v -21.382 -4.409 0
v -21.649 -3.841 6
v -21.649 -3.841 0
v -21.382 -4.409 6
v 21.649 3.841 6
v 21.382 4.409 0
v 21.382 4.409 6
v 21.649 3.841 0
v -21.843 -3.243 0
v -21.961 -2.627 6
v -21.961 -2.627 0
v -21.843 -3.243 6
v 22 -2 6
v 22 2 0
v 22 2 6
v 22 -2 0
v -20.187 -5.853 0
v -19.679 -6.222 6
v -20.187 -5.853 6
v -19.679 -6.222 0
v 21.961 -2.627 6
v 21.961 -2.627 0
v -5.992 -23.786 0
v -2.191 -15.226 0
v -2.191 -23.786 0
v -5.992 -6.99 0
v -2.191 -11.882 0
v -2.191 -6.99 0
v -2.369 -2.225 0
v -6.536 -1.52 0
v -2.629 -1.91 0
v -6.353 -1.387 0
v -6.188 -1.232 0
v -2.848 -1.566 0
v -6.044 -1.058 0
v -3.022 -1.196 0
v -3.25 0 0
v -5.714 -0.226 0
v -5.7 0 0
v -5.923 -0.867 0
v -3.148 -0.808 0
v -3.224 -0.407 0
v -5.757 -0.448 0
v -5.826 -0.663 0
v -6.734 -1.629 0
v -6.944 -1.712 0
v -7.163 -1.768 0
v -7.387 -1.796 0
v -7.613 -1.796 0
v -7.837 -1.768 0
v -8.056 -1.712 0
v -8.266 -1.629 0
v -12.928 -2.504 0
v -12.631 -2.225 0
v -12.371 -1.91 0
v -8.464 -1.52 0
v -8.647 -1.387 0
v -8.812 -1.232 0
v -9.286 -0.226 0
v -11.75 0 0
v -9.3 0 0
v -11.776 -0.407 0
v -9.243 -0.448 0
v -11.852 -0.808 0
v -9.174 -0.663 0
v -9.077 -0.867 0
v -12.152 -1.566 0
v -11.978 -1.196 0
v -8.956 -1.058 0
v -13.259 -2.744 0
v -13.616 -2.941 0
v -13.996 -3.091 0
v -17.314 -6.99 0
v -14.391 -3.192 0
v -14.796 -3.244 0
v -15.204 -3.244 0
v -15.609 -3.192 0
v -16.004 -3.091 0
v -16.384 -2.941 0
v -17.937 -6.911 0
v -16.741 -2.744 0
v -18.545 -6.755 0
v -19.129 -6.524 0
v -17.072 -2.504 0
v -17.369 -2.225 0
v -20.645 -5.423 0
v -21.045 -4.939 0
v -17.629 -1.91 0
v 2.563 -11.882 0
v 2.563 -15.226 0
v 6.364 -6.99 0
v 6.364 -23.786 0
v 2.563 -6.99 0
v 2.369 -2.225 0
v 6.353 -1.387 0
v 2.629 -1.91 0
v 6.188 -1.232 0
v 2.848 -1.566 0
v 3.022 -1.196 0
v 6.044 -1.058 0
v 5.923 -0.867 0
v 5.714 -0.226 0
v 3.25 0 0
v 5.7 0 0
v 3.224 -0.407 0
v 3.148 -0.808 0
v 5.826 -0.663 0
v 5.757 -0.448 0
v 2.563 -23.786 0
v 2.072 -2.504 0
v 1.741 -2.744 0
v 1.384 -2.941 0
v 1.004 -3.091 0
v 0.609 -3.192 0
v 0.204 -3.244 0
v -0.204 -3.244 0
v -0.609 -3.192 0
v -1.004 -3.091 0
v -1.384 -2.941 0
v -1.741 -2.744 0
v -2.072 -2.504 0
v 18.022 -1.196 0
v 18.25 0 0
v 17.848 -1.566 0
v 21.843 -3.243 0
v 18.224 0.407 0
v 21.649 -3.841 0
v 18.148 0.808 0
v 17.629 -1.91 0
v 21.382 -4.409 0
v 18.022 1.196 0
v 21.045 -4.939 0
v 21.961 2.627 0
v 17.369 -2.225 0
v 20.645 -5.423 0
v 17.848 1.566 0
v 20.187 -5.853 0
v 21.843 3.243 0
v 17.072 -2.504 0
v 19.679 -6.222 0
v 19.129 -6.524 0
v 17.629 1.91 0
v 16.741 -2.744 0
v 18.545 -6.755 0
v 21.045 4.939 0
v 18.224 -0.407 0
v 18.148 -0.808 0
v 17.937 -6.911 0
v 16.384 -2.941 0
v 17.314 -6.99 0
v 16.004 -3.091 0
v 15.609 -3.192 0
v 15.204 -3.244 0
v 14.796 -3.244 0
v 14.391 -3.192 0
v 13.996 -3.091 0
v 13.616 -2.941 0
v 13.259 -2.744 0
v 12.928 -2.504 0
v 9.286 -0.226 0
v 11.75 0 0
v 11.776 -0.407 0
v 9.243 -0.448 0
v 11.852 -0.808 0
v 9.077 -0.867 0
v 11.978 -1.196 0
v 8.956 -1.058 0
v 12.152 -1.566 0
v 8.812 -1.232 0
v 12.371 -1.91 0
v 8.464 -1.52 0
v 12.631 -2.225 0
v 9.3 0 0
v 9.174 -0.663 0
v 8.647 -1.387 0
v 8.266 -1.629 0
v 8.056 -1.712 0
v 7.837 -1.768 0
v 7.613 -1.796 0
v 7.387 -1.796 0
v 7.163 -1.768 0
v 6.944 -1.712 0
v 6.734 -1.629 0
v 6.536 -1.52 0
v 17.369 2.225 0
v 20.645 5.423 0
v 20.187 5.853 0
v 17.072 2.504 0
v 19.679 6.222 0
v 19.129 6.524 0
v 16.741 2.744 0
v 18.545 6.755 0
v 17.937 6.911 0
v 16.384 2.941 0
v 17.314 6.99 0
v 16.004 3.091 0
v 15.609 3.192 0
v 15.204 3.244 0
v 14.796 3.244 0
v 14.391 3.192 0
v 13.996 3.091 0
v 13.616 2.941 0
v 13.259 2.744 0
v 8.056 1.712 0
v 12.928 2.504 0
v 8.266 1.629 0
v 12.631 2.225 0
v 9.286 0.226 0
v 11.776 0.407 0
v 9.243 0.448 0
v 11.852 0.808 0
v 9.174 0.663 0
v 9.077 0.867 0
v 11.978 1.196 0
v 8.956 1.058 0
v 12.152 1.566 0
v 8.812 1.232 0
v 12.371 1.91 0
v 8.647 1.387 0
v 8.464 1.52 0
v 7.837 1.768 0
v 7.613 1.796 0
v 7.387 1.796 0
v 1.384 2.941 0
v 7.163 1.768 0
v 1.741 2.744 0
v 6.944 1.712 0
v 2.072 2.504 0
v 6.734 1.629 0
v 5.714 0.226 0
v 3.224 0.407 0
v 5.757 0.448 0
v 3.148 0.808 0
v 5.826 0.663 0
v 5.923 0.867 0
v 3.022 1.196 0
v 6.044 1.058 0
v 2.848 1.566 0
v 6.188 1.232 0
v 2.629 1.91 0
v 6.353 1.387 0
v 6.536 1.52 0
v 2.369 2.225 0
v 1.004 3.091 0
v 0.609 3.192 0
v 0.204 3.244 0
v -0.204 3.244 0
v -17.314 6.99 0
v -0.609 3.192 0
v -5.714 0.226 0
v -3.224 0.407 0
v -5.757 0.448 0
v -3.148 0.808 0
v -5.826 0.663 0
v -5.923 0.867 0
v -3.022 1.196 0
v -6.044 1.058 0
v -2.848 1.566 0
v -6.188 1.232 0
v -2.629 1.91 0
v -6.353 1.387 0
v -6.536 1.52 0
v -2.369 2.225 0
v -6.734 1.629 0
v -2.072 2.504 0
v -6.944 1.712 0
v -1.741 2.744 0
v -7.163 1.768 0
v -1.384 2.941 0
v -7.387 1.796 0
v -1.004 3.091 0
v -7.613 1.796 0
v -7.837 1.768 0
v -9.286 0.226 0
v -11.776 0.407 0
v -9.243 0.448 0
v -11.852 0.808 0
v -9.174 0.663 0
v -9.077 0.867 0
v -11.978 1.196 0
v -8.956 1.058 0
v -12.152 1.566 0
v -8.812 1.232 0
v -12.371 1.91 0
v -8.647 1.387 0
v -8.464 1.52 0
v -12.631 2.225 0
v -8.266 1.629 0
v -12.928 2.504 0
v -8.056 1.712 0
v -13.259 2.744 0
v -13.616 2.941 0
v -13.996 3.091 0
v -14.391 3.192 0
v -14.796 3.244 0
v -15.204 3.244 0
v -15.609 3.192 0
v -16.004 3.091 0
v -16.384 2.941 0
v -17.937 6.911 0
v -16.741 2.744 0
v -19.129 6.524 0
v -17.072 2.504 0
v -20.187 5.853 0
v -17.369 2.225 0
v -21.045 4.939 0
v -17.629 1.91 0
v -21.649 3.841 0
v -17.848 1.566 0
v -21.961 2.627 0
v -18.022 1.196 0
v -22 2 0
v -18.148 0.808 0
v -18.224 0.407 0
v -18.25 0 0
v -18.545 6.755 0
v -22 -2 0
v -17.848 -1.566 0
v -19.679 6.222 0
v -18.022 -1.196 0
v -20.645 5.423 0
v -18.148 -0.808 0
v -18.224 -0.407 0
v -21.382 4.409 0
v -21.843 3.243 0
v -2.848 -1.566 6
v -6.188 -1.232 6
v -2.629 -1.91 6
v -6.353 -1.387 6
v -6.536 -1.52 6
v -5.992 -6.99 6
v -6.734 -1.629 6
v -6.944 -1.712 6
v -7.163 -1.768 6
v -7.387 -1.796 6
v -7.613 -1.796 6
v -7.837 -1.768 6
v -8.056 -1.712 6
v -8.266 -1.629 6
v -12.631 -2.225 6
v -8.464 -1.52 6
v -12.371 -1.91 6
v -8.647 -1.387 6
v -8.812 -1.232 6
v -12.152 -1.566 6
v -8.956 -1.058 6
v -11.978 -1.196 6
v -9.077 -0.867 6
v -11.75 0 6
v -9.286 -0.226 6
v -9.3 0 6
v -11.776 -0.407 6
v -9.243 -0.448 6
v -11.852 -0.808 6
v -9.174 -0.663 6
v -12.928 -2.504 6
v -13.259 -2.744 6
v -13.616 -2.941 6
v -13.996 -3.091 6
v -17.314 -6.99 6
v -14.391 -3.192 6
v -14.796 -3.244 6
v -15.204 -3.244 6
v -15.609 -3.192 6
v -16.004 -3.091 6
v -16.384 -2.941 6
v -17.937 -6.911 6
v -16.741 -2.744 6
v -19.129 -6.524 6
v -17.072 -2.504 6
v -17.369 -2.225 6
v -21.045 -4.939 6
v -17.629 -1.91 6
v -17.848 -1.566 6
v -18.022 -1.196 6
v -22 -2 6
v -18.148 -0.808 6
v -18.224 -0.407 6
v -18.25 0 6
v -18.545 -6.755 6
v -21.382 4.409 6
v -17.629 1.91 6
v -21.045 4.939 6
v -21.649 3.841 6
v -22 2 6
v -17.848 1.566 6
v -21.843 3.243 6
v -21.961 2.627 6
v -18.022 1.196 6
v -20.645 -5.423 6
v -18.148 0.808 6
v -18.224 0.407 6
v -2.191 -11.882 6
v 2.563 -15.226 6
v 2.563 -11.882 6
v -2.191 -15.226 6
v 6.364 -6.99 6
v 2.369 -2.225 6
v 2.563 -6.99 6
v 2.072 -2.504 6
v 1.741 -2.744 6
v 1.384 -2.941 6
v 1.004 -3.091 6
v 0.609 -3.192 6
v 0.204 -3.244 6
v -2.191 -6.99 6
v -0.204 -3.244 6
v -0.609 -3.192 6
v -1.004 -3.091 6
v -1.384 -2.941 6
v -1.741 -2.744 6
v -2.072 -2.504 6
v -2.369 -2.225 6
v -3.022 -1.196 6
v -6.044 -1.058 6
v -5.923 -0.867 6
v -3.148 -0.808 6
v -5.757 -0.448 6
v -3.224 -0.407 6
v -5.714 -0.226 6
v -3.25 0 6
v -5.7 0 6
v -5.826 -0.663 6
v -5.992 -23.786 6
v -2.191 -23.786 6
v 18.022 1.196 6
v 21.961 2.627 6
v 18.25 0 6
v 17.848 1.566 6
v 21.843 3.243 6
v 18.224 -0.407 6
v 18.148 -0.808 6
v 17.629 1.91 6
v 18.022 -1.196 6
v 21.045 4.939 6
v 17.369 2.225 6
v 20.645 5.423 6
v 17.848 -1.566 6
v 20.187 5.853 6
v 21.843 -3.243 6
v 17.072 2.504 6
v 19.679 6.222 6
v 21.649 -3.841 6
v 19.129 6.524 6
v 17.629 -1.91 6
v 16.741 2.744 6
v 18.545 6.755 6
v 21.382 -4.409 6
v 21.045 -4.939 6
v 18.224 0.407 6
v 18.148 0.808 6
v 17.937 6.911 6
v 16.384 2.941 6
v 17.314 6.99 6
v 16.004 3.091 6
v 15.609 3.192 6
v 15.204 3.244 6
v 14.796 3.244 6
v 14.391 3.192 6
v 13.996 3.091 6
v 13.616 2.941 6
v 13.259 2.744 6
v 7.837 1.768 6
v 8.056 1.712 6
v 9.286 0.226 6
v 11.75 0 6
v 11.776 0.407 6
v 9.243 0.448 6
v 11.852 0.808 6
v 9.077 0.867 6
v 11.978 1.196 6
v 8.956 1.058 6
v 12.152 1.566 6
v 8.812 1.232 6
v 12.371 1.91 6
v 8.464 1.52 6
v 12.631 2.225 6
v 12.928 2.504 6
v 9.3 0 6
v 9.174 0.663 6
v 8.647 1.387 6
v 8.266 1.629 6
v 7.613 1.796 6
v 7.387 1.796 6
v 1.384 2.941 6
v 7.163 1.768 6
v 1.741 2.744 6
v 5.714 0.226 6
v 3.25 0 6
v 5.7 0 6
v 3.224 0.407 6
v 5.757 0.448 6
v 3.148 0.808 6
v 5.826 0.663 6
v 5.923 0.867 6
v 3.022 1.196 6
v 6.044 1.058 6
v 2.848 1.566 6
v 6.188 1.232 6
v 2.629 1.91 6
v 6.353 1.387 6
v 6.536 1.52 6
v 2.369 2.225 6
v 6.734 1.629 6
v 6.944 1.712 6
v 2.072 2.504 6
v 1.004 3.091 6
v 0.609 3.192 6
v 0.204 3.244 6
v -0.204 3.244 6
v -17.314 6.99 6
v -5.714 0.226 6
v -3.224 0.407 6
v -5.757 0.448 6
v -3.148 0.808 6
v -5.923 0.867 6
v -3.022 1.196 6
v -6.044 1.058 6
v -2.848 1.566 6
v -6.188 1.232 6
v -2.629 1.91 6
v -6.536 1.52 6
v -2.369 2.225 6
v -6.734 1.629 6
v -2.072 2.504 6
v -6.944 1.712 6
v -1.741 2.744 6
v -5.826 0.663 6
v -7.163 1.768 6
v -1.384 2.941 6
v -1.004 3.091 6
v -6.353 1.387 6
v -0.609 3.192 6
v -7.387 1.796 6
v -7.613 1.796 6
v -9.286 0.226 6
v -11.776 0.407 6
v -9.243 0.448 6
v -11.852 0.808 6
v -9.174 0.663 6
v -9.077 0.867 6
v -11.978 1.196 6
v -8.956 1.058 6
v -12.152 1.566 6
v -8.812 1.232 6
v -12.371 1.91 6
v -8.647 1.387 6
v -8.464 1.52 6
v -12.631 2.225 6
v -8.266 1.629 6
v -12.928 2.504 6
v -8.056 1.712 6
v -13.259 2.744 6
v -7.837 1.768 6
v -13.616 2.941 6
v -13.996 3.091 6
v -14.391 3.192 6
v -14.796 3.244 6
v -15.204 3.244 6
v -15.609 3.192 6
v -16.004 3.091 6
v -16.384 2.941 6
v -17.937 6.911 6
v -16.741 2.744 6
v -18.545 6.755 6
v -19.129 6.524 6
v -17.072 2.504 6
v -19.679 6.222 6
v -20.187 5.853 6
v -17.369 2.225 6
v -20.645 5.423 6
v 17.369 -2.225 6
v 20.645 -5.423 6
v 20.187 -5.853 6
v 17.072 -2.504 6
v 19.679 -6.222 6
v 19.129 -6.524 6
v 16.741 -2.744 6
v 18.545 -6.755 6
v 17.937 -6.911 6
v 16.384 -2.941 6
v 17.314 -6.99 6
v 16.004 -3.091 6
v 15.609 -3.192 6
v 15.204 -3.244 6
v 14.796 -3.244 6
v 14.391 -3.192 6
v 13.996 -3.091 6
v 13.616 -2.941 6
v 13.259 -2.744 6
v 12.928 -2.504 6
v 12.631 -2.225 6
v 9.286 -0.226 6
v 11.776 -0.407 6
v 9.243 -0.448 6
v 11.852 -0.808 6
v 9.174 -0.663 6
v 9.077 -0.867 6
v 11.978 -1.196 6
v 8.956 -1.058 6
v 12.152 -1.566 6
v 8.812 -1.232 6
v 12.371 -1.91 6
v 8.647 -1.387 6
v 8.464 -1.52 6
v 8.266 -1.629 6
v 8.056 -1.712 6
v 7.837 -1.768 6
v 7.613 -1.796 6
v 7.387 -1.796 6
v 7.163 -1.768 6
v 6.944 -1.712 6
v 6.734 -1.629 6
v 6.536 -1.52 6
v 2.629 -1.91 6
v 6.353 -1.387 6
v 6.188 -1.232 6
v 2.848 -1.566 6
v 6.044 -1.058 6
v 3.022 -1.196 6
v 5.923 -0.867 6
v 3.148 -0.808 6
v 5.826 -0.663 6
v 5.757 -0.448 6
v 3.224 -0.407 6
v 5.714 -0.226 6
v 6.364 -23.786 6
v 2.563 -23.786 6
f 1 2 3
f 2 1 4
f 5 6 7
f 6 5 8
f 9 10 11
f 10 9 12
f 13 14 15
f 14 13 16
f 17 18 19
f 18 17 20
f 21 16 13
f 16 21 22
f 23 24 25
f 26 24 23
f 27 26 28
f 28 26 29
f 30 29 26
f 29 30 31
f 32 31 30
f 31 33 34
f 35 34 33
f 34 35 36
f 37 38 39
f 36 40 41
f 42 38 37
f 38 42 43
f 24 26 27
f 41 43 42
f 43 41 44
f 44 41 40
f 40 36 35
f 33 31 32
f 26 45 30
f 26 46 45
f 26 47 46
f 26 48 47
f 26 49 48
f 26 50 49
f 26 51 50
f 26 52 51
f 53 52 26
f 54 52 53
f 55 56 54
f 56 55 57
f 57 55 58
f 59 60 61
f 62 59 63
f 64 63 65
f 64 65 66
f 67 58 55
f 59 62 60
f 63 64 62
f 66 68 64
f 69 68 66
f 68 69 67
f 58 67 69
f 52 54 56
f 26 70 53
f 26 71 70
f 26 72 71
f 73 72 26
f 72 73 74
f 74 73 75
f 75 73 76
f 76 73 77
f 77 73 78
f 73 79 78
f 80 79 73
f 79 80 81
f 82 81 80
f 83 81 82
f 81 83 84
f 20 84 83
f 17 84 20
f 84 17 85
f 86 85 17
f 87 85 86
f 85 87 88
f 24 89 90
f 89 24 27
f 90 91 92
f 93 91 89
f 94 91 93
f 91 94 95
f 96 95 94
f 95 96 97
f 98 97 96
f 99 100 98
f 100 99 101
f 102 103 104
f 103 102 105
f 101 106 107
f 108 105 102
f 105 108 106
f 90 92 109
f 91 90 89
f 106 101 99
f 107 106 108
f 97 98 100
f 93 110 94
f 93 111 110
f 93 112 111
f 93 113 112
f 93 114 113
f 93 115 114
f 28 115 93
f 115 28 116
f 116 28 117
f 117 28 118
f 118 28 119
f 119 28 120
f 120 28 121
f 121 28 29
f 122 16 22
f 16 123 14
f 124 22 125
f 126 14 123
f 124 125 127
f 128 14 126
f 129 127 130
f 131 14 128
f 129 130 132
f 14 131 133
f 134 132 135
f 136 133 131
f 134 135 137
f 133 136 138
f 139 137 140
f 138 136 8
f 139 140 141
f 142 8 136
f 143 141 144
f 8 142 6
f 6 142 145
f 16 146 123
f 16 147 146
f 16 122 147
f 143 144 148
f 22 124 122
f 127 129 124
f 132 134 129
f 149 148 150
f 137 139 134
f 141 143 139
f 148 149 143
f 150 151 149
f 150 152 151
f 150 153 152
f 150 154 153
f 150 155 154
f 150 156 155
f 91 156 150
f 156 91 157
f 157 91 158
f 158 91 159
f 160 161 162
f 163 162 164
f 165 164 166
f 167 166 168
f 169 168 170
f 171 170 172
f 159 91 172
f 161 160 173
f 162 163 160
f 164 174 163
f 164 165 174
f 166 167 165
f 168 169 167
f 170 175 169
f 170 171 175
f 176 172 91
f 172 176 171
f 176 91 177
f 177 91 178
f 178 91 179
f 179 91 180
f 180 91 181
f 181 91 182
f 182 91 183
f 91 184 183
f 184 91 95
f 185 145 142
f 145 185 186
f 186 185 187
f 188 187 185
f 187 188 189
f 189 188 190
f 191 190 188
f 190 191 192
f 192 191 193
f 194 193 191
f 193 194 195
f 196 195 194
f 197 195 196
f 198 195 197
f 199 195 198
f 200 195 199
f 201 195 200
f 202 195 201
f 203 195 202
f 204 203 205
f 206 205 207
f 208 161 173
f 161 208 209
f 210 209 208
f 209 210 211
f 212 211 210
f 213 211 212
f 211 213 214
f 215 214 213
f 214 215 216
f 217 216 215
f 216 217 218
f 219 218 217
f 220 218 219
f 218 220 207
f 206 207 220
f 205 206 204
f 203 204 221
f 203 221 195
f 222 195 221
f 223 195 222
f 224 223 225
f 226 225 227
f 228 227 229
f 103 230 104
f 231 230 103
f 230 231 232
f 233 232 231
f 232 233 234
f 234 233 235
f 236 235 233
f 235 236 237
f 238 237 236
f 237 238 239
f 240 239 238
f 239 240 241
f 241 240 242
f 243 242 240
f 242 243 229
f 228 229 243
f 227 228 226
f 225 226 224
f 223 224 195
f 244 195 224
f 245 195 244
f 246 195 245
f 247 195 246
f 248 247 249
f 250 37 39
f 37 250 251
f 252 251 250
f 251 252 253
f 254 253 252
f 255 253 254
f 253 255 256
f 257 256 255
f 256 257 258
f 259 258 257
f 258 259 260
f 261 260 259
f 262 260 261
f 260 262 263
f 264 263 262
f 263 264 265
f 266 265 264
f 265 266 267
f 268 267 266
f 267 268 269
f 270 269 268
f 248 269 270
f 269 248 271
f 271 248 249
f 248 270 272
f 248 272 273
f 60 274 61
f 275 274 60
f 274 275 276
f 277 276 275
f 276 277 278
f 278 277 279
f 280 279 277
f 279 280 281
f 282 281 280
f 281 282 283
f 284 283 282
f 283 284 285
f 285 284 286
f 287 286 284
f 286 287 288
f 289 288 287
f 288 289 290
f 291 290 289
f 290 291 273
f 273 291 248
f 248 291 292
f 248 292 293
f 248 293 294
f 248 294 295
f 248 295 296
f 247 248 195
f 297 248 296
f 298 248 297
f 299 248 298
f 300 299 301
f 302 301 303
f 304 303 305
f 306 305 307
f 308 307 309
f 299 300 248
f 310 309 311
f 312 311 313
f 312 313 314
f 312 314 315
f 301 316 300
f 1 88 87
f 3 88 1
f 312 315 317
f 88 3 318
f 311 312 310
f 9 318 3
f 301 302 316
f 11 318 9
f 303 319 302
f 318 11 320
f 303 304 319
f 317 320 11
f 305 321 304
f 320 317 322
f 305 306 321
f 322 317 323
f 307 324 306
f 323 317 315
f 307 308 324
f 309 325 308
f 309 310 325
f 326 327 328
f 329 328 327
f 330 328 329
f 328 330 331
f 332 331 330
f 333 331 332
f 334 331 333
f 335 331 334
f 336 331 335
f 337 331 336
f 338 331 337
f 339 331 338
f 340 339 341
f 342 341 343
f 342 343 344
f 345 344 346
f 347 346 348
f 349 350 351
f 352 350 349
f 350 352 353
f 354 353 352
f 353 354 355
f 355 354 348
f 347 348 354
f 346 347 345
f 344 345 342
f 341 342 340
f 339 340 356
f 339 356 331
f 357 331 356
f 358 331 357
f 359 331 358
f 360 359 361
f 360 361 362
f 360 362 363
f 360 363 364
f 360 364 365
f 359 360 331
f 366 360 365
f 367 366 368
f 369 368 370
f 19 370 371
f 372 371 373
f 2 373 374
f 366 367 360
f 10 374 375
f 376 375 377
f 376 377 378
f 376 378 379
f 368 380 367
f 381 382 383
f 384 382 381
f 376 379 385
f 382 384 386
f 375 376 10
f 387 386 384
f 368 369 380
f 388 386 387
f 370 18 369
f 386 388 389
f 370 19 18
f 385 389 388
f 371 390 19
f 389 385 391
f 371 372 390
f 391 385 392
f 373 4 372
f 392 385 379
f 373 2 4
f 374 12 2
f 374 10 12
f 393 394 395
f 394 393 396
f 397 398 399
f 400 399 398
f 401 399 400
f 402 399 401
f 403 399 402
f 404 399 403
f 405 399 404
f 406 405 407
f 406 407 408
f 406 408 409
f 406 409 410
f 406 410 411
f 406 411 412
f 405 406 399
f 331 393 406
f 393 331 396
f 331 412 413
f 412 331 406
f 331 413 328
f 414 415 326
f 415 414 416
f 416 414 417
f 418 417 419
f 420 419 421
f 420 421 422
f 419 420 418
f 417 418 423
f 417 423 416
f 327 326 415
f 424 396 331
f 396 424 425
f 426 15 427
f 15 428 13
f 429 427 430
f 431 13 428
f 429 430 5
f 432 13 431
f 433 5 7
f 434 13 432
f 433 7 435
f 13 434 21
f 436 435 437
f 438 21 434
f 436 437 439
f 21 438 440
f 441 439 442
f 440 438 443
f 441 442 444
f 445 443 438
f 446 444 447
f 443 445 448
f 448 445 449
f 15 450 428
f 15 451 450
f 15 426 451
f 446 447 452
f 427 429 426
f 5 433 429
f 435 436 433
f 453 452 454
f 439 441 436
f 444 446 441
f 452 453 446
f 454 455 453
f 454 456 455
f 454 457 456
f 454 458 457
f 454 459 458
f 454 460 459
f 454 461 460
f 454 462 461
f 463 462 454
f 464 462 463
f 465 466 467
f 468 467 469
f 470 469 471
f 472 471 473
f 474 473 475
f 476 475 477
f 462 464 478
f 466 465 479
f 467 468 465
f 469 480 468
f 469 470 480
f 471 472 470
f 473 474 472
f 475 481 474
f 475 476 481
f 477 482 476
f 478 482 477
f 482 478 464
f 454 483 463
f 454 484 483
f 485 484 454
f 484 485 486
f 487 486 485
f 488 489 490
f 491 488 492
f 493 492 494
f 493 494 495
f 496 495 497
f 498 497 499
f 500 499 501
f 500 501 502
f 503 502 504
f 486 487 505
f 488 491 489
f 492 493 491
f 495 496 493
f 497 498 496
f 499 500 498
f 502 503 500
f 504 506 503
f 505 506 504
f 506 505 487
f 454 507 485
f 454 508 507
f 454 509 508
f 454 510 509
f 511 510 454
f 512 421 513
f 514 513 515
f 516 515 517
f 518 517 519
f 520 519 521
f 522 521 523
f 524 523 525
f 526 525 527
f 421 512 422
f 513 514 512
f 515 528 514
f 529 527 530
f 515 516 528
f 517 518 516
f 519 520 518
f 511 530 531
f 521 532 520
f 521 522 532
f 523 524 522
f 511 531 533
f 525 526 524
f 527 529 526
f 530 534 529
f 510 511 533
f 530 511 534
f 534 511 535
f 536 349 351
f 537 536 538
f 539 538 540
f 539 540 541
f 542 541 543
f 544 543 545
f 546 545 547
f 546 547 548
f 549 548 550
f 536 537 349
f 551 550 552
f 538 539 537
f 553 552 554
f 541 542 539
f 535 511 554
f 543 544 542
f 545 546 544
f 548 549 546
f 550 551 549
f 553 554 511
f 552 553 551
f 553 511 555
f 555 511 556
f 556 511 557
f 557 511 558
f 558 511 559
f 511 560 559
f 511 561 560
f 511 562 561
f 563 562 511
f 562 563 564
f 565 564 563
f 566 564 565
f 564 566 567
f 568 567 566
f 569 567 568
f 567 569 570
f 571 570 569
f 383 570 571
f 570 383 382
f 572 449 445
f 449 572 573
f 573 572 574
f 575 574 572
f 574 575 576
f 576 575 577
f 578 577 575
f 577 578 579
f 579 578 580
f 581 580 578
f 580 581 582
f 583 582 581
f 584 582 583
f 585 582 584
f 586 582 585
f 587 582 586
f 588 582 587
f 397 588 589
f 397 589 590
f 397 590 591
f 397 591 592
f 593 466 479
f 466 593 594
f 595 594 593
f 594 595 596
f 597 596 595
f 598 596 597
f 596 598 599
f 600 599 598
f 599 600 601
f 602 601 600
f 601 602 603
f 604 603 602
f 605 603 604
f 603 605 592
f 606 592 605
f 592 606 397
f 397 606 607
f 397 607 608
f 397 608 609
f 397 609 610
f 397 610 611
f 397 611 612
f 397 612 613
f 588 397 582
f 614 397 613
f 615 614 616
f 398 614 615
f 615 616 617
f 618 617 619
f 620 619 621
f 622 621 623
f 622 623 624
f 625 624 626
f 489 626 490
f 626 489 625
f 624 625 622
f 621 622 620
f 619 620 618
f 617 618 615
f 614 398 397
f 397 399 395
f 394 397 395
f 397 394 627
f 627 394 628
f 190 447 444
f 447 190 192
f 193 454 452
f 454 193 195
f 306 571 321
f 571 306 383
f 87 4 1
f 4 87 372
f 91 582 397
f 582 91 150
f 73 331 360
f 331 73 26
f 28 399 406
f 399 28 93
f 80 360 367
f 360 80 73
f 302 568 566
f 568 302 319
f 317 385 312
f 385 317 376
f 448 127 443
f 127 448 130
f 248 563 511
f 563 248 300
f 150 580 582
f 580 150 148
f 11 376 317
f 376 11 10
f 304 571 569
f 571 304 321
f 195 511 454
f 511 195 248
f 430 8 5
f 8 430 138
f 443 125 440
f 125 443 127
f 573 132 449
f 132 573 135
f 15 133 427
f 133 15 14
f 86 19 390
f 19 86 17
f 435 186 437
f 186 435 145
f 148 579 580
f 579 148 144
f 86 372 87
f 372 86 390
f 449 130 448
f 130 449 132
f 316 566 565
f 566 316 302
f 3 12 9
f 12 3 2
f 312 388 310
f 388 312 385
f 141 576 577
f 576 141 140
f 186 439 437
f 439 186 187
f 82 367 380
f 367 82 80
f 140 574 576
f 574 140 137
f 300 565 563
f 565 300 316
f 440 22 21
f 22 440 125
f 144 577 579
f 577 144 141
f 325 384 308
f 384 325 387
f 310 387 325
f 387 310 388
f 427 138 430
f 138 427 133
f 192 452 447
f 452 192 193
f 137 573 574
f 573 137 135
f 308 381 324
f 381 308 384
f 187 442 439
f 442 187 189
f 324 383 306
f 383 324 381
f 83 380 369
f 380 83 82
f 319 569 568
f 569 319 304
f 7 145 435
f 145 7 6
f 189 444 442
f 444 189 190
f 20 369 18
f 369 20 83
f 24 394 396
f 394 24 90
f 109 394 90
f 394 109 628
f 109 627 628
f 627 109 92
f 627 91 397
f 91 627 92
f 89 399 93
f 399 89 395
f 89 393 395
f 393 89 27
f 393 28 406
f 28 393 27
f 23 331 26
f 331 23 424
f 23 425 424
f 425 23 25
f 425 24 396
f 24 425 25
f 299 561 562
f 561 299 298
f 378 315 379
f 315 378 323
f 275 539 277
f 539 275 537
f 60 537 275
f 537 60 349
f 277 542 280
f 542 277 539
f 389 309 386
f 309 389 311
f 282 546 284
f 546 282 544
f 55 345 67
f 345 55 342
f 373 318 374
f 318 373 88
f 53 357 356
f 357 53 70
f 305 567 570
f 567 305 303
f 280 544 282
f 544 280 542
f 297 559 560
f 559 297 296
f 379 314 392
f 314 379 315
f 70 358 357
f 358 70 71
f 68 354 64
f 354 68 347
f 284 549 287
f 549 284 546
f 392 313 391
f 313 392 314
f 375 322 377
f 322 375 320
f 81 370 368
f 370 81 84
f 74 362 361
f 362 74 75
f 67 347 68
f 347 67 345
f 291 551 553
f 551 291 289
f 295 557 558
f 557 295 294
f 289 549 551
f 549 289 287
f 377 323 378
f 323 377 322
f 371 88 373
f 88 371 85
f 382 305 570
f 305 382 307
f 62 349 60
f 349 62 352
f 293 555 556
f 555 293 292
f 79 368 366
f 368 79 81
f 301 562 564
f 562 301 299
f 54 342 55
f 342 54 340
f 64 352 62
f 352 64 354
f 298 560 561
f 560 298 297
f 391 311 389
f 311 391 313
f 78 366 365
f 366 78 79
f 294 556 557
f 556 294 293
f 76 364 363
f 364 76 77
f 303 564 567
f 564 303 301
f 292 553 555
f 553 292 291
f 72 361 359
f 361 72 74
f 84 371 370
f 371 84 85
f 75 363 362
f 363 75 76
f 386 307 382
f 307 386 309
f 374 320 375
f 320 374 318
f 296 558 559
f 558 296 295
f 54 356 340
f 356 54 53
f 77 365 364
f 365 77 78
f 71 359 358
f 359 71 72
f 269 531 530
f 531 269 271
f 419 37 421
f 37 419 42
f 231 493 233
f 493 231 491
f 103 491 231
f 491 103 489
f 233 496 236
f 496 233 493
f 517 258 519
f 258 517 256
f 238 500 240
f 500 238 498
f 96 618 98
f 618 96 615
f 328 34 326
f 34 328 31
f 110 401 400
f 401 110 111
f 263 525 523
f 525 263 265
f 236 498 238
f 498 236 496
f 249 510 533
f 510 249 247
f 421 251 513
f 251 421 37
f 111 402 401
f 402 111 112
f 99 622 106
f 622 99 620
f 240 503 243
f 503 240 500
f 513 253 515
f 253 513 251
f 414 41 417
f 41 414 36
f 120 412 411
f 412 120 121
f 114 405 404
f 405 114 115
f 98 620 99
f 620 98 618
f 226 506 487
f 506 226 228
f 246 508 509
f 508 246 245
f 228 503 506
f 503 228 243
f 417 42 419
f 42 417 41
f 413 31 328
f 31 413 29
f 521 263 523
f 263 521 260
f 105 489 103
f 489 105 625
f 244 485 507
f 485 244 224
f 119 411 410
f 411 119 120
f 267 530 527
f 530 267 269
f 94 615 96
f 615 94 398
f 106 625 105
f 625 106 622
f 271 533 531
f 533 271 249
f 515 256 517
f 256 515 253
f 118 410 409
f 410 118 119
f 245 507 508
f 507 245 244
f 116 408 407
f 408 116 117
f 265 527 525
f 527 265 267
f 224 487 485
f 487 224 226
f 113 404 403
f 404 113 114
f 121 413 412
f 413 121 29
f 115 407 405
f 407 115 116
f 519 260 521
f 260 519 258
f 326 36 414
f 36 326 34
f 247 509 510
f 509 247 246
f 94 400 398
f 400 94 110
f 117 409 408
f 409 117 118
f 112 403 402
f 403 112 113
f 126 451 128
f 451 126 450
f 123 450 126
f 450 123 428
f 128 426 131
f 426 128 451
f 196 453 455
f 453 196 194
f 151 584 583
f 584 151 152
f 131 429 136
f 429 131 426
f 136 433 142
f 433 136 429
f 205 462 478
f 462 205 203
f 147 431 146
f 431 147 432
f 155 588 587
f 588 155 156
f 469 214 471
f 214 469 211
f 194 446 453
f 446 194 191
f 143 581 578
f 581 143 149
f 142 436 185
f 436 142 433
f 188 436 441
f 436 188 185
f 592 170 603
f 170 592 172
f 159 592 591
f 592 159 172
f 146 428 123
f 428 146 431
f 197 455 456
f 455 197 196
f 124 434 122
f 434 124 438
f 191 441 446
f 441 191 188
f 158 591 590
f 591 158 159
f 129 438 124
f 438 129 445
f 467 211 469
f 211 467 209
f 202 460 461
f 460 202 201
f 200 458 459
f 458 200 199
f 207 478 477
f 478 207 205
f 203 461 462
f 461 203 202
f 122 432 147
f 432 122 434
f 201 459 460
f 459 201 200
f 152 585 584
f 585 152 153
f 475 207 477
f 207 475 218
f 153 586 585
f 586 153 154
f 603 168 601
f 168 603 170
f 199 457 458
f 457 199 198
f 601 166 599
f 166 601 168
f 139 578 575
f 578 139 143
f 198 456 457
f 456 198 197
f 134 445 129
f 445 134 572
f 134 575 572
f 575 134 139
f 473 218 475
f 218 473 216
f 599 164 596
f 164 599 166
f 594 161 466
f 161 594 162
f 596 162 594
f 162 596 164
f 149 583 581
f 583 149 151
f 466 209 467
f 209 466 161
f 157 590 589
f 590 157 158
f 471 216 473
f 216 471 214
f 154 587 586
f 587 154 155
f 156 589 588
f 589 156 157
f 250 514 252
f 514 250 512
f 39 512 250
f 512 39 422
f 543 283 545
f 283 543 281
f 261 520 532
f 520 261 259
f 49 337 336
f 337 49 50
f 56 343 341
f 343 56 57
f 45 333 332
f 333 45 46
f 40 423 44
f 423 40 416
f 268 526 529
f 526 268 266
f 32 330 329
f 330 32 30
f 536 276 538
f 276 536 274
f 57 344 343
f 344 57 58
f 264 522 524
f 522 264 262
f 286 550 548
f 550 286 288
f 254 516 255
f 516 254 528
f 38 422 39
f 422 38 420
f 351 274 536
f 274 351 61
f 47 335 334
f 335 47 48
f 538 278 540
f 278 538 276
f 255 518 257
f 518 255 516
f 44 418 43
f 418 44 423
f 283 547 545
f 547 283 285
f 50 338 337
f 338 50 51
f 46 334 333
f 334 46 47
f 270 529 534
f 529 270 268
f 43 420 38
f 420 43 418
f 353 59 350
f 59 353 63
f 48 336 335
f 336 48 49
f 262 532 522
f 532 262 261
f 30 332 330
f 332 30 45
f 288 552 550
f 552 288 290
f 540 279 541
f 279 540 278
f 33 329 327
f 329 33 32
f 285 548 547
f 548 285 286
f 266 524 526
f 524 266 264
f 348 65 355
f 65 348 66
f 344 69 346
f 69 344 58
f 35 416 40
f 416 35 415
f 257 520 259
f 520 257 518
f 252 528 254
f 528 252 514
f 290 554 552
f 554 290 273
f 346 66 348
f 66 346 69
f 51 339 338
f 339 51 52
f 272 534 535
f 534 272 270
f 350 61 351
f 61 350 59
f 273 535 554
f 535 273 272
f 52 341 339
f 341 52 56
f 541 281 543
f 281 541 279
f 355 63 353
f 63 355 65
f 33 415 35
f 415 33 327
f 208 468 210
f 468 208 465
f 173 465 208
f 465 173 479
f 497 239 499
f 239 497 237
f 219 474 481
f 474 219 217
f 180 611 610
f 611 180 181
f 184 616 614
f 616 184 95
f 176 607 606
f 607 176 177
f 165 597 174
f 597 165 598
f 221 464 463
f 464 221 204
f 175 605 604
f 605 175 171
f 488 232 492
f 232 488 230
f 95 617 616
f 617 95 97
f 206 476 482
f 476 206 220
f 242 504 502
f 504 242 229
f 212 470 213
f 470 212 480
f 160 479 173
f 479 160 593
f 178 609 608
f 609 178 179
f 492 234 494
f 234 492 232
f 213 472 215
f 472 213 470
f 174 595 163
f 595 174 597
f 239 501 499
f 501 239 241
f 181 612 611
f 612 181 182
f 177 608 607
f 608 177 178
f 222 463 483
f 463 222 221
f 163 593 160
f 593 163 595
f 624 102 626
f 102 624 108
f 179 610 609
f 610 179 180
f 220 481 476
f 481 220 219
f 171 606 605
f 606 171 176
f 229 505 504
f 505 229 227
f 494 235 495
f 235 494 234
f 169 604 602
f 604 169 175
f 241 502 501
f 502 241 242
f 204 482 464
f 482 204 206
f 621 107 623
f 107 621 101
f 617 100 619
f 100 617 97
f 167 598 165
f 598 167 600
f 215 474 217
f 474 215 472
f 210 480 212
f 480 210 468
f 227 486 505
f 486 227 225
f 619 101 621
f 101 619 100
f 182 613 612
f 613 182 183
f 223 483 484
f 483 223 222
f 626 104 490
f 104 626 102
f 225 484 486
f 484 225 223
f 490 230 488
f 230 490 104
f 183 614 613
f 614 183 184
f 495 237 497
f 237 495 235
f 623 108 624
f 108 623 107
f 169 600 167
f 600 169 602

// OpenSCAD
$fn = 50;


difference() {
	union() {
		hull() {
			translate(v = [-17.0000000000, 2.0000000000, 0]) {
				cylinder(h = 6, r = 5);
			}
			translate(v = [17.0000000000, 2.0000000000, 0]) {
				cylinder(h = 6, r = 5);
			}
			translate(v = [-17.0000000000, -2.0000000000, 0]) {
				cylinder(h = 6, r = 5);
			}
			translate(v = [17.0000000000, -2.0000000000, 0]) {
				cylinder(h = 6, r = 5);
			}
		}
		translate(v = [0, -5, 0]) {
			linear_extrude(height = 6) {
				text(font = "DejaVu Sans Mono:style=Bold", halign = "center", size = 19.0000000000, text = "H", valign = "top");
			}
		}
	}
	union() {
		translate(v = [-15.0000000000, 0.0000000000, 0]) {
			translate(v = [0, 0, -100]) {
				cylinder(h = 200, r = 3.2500000000);
			}
		}
		translate(v = [0, 0, -100]) {
			cylinder(h = 200, r = 3.2500000000);
		}
		translate(v = [15.0000000000, 0.0000000000, 0]) {
			translate(v = [0, 0, -100]) {
				cylinder(h = 200, r = 3.2500000000);
			}
		}
		translate(v = [-15.0000000000, 0.0000000000, 0]) {
			translate(v = [0, 0, -100]) {
				cylinder(h = 200, r = 1.8000000000);
			}
		}
		translate(v = [-7.5000000000, 0.0000000000, 0]) {
			translate(v = [0, 0, -100]) {
				cylinder(h = 200, r = 1.8000000000);
			}
		}
		translate(v = [0, 0, -100]) {
			cylinder(h = 200, r = 1.8000000000);
		}
		translate(v = [7.5000000000, 0.0000000000, 0]) {
			translate(v = [0, 0, -100]) {
				cylinder(h = 200, r = 1.8000000000);
			}
		}
		translate(v = [15.0000000000, 0.0000000000, 0]) {
			translate(v = [0, 0, -100]) {
				cylinder(h = 200, r = 1.8000000000);
			}
		}
	}
}
